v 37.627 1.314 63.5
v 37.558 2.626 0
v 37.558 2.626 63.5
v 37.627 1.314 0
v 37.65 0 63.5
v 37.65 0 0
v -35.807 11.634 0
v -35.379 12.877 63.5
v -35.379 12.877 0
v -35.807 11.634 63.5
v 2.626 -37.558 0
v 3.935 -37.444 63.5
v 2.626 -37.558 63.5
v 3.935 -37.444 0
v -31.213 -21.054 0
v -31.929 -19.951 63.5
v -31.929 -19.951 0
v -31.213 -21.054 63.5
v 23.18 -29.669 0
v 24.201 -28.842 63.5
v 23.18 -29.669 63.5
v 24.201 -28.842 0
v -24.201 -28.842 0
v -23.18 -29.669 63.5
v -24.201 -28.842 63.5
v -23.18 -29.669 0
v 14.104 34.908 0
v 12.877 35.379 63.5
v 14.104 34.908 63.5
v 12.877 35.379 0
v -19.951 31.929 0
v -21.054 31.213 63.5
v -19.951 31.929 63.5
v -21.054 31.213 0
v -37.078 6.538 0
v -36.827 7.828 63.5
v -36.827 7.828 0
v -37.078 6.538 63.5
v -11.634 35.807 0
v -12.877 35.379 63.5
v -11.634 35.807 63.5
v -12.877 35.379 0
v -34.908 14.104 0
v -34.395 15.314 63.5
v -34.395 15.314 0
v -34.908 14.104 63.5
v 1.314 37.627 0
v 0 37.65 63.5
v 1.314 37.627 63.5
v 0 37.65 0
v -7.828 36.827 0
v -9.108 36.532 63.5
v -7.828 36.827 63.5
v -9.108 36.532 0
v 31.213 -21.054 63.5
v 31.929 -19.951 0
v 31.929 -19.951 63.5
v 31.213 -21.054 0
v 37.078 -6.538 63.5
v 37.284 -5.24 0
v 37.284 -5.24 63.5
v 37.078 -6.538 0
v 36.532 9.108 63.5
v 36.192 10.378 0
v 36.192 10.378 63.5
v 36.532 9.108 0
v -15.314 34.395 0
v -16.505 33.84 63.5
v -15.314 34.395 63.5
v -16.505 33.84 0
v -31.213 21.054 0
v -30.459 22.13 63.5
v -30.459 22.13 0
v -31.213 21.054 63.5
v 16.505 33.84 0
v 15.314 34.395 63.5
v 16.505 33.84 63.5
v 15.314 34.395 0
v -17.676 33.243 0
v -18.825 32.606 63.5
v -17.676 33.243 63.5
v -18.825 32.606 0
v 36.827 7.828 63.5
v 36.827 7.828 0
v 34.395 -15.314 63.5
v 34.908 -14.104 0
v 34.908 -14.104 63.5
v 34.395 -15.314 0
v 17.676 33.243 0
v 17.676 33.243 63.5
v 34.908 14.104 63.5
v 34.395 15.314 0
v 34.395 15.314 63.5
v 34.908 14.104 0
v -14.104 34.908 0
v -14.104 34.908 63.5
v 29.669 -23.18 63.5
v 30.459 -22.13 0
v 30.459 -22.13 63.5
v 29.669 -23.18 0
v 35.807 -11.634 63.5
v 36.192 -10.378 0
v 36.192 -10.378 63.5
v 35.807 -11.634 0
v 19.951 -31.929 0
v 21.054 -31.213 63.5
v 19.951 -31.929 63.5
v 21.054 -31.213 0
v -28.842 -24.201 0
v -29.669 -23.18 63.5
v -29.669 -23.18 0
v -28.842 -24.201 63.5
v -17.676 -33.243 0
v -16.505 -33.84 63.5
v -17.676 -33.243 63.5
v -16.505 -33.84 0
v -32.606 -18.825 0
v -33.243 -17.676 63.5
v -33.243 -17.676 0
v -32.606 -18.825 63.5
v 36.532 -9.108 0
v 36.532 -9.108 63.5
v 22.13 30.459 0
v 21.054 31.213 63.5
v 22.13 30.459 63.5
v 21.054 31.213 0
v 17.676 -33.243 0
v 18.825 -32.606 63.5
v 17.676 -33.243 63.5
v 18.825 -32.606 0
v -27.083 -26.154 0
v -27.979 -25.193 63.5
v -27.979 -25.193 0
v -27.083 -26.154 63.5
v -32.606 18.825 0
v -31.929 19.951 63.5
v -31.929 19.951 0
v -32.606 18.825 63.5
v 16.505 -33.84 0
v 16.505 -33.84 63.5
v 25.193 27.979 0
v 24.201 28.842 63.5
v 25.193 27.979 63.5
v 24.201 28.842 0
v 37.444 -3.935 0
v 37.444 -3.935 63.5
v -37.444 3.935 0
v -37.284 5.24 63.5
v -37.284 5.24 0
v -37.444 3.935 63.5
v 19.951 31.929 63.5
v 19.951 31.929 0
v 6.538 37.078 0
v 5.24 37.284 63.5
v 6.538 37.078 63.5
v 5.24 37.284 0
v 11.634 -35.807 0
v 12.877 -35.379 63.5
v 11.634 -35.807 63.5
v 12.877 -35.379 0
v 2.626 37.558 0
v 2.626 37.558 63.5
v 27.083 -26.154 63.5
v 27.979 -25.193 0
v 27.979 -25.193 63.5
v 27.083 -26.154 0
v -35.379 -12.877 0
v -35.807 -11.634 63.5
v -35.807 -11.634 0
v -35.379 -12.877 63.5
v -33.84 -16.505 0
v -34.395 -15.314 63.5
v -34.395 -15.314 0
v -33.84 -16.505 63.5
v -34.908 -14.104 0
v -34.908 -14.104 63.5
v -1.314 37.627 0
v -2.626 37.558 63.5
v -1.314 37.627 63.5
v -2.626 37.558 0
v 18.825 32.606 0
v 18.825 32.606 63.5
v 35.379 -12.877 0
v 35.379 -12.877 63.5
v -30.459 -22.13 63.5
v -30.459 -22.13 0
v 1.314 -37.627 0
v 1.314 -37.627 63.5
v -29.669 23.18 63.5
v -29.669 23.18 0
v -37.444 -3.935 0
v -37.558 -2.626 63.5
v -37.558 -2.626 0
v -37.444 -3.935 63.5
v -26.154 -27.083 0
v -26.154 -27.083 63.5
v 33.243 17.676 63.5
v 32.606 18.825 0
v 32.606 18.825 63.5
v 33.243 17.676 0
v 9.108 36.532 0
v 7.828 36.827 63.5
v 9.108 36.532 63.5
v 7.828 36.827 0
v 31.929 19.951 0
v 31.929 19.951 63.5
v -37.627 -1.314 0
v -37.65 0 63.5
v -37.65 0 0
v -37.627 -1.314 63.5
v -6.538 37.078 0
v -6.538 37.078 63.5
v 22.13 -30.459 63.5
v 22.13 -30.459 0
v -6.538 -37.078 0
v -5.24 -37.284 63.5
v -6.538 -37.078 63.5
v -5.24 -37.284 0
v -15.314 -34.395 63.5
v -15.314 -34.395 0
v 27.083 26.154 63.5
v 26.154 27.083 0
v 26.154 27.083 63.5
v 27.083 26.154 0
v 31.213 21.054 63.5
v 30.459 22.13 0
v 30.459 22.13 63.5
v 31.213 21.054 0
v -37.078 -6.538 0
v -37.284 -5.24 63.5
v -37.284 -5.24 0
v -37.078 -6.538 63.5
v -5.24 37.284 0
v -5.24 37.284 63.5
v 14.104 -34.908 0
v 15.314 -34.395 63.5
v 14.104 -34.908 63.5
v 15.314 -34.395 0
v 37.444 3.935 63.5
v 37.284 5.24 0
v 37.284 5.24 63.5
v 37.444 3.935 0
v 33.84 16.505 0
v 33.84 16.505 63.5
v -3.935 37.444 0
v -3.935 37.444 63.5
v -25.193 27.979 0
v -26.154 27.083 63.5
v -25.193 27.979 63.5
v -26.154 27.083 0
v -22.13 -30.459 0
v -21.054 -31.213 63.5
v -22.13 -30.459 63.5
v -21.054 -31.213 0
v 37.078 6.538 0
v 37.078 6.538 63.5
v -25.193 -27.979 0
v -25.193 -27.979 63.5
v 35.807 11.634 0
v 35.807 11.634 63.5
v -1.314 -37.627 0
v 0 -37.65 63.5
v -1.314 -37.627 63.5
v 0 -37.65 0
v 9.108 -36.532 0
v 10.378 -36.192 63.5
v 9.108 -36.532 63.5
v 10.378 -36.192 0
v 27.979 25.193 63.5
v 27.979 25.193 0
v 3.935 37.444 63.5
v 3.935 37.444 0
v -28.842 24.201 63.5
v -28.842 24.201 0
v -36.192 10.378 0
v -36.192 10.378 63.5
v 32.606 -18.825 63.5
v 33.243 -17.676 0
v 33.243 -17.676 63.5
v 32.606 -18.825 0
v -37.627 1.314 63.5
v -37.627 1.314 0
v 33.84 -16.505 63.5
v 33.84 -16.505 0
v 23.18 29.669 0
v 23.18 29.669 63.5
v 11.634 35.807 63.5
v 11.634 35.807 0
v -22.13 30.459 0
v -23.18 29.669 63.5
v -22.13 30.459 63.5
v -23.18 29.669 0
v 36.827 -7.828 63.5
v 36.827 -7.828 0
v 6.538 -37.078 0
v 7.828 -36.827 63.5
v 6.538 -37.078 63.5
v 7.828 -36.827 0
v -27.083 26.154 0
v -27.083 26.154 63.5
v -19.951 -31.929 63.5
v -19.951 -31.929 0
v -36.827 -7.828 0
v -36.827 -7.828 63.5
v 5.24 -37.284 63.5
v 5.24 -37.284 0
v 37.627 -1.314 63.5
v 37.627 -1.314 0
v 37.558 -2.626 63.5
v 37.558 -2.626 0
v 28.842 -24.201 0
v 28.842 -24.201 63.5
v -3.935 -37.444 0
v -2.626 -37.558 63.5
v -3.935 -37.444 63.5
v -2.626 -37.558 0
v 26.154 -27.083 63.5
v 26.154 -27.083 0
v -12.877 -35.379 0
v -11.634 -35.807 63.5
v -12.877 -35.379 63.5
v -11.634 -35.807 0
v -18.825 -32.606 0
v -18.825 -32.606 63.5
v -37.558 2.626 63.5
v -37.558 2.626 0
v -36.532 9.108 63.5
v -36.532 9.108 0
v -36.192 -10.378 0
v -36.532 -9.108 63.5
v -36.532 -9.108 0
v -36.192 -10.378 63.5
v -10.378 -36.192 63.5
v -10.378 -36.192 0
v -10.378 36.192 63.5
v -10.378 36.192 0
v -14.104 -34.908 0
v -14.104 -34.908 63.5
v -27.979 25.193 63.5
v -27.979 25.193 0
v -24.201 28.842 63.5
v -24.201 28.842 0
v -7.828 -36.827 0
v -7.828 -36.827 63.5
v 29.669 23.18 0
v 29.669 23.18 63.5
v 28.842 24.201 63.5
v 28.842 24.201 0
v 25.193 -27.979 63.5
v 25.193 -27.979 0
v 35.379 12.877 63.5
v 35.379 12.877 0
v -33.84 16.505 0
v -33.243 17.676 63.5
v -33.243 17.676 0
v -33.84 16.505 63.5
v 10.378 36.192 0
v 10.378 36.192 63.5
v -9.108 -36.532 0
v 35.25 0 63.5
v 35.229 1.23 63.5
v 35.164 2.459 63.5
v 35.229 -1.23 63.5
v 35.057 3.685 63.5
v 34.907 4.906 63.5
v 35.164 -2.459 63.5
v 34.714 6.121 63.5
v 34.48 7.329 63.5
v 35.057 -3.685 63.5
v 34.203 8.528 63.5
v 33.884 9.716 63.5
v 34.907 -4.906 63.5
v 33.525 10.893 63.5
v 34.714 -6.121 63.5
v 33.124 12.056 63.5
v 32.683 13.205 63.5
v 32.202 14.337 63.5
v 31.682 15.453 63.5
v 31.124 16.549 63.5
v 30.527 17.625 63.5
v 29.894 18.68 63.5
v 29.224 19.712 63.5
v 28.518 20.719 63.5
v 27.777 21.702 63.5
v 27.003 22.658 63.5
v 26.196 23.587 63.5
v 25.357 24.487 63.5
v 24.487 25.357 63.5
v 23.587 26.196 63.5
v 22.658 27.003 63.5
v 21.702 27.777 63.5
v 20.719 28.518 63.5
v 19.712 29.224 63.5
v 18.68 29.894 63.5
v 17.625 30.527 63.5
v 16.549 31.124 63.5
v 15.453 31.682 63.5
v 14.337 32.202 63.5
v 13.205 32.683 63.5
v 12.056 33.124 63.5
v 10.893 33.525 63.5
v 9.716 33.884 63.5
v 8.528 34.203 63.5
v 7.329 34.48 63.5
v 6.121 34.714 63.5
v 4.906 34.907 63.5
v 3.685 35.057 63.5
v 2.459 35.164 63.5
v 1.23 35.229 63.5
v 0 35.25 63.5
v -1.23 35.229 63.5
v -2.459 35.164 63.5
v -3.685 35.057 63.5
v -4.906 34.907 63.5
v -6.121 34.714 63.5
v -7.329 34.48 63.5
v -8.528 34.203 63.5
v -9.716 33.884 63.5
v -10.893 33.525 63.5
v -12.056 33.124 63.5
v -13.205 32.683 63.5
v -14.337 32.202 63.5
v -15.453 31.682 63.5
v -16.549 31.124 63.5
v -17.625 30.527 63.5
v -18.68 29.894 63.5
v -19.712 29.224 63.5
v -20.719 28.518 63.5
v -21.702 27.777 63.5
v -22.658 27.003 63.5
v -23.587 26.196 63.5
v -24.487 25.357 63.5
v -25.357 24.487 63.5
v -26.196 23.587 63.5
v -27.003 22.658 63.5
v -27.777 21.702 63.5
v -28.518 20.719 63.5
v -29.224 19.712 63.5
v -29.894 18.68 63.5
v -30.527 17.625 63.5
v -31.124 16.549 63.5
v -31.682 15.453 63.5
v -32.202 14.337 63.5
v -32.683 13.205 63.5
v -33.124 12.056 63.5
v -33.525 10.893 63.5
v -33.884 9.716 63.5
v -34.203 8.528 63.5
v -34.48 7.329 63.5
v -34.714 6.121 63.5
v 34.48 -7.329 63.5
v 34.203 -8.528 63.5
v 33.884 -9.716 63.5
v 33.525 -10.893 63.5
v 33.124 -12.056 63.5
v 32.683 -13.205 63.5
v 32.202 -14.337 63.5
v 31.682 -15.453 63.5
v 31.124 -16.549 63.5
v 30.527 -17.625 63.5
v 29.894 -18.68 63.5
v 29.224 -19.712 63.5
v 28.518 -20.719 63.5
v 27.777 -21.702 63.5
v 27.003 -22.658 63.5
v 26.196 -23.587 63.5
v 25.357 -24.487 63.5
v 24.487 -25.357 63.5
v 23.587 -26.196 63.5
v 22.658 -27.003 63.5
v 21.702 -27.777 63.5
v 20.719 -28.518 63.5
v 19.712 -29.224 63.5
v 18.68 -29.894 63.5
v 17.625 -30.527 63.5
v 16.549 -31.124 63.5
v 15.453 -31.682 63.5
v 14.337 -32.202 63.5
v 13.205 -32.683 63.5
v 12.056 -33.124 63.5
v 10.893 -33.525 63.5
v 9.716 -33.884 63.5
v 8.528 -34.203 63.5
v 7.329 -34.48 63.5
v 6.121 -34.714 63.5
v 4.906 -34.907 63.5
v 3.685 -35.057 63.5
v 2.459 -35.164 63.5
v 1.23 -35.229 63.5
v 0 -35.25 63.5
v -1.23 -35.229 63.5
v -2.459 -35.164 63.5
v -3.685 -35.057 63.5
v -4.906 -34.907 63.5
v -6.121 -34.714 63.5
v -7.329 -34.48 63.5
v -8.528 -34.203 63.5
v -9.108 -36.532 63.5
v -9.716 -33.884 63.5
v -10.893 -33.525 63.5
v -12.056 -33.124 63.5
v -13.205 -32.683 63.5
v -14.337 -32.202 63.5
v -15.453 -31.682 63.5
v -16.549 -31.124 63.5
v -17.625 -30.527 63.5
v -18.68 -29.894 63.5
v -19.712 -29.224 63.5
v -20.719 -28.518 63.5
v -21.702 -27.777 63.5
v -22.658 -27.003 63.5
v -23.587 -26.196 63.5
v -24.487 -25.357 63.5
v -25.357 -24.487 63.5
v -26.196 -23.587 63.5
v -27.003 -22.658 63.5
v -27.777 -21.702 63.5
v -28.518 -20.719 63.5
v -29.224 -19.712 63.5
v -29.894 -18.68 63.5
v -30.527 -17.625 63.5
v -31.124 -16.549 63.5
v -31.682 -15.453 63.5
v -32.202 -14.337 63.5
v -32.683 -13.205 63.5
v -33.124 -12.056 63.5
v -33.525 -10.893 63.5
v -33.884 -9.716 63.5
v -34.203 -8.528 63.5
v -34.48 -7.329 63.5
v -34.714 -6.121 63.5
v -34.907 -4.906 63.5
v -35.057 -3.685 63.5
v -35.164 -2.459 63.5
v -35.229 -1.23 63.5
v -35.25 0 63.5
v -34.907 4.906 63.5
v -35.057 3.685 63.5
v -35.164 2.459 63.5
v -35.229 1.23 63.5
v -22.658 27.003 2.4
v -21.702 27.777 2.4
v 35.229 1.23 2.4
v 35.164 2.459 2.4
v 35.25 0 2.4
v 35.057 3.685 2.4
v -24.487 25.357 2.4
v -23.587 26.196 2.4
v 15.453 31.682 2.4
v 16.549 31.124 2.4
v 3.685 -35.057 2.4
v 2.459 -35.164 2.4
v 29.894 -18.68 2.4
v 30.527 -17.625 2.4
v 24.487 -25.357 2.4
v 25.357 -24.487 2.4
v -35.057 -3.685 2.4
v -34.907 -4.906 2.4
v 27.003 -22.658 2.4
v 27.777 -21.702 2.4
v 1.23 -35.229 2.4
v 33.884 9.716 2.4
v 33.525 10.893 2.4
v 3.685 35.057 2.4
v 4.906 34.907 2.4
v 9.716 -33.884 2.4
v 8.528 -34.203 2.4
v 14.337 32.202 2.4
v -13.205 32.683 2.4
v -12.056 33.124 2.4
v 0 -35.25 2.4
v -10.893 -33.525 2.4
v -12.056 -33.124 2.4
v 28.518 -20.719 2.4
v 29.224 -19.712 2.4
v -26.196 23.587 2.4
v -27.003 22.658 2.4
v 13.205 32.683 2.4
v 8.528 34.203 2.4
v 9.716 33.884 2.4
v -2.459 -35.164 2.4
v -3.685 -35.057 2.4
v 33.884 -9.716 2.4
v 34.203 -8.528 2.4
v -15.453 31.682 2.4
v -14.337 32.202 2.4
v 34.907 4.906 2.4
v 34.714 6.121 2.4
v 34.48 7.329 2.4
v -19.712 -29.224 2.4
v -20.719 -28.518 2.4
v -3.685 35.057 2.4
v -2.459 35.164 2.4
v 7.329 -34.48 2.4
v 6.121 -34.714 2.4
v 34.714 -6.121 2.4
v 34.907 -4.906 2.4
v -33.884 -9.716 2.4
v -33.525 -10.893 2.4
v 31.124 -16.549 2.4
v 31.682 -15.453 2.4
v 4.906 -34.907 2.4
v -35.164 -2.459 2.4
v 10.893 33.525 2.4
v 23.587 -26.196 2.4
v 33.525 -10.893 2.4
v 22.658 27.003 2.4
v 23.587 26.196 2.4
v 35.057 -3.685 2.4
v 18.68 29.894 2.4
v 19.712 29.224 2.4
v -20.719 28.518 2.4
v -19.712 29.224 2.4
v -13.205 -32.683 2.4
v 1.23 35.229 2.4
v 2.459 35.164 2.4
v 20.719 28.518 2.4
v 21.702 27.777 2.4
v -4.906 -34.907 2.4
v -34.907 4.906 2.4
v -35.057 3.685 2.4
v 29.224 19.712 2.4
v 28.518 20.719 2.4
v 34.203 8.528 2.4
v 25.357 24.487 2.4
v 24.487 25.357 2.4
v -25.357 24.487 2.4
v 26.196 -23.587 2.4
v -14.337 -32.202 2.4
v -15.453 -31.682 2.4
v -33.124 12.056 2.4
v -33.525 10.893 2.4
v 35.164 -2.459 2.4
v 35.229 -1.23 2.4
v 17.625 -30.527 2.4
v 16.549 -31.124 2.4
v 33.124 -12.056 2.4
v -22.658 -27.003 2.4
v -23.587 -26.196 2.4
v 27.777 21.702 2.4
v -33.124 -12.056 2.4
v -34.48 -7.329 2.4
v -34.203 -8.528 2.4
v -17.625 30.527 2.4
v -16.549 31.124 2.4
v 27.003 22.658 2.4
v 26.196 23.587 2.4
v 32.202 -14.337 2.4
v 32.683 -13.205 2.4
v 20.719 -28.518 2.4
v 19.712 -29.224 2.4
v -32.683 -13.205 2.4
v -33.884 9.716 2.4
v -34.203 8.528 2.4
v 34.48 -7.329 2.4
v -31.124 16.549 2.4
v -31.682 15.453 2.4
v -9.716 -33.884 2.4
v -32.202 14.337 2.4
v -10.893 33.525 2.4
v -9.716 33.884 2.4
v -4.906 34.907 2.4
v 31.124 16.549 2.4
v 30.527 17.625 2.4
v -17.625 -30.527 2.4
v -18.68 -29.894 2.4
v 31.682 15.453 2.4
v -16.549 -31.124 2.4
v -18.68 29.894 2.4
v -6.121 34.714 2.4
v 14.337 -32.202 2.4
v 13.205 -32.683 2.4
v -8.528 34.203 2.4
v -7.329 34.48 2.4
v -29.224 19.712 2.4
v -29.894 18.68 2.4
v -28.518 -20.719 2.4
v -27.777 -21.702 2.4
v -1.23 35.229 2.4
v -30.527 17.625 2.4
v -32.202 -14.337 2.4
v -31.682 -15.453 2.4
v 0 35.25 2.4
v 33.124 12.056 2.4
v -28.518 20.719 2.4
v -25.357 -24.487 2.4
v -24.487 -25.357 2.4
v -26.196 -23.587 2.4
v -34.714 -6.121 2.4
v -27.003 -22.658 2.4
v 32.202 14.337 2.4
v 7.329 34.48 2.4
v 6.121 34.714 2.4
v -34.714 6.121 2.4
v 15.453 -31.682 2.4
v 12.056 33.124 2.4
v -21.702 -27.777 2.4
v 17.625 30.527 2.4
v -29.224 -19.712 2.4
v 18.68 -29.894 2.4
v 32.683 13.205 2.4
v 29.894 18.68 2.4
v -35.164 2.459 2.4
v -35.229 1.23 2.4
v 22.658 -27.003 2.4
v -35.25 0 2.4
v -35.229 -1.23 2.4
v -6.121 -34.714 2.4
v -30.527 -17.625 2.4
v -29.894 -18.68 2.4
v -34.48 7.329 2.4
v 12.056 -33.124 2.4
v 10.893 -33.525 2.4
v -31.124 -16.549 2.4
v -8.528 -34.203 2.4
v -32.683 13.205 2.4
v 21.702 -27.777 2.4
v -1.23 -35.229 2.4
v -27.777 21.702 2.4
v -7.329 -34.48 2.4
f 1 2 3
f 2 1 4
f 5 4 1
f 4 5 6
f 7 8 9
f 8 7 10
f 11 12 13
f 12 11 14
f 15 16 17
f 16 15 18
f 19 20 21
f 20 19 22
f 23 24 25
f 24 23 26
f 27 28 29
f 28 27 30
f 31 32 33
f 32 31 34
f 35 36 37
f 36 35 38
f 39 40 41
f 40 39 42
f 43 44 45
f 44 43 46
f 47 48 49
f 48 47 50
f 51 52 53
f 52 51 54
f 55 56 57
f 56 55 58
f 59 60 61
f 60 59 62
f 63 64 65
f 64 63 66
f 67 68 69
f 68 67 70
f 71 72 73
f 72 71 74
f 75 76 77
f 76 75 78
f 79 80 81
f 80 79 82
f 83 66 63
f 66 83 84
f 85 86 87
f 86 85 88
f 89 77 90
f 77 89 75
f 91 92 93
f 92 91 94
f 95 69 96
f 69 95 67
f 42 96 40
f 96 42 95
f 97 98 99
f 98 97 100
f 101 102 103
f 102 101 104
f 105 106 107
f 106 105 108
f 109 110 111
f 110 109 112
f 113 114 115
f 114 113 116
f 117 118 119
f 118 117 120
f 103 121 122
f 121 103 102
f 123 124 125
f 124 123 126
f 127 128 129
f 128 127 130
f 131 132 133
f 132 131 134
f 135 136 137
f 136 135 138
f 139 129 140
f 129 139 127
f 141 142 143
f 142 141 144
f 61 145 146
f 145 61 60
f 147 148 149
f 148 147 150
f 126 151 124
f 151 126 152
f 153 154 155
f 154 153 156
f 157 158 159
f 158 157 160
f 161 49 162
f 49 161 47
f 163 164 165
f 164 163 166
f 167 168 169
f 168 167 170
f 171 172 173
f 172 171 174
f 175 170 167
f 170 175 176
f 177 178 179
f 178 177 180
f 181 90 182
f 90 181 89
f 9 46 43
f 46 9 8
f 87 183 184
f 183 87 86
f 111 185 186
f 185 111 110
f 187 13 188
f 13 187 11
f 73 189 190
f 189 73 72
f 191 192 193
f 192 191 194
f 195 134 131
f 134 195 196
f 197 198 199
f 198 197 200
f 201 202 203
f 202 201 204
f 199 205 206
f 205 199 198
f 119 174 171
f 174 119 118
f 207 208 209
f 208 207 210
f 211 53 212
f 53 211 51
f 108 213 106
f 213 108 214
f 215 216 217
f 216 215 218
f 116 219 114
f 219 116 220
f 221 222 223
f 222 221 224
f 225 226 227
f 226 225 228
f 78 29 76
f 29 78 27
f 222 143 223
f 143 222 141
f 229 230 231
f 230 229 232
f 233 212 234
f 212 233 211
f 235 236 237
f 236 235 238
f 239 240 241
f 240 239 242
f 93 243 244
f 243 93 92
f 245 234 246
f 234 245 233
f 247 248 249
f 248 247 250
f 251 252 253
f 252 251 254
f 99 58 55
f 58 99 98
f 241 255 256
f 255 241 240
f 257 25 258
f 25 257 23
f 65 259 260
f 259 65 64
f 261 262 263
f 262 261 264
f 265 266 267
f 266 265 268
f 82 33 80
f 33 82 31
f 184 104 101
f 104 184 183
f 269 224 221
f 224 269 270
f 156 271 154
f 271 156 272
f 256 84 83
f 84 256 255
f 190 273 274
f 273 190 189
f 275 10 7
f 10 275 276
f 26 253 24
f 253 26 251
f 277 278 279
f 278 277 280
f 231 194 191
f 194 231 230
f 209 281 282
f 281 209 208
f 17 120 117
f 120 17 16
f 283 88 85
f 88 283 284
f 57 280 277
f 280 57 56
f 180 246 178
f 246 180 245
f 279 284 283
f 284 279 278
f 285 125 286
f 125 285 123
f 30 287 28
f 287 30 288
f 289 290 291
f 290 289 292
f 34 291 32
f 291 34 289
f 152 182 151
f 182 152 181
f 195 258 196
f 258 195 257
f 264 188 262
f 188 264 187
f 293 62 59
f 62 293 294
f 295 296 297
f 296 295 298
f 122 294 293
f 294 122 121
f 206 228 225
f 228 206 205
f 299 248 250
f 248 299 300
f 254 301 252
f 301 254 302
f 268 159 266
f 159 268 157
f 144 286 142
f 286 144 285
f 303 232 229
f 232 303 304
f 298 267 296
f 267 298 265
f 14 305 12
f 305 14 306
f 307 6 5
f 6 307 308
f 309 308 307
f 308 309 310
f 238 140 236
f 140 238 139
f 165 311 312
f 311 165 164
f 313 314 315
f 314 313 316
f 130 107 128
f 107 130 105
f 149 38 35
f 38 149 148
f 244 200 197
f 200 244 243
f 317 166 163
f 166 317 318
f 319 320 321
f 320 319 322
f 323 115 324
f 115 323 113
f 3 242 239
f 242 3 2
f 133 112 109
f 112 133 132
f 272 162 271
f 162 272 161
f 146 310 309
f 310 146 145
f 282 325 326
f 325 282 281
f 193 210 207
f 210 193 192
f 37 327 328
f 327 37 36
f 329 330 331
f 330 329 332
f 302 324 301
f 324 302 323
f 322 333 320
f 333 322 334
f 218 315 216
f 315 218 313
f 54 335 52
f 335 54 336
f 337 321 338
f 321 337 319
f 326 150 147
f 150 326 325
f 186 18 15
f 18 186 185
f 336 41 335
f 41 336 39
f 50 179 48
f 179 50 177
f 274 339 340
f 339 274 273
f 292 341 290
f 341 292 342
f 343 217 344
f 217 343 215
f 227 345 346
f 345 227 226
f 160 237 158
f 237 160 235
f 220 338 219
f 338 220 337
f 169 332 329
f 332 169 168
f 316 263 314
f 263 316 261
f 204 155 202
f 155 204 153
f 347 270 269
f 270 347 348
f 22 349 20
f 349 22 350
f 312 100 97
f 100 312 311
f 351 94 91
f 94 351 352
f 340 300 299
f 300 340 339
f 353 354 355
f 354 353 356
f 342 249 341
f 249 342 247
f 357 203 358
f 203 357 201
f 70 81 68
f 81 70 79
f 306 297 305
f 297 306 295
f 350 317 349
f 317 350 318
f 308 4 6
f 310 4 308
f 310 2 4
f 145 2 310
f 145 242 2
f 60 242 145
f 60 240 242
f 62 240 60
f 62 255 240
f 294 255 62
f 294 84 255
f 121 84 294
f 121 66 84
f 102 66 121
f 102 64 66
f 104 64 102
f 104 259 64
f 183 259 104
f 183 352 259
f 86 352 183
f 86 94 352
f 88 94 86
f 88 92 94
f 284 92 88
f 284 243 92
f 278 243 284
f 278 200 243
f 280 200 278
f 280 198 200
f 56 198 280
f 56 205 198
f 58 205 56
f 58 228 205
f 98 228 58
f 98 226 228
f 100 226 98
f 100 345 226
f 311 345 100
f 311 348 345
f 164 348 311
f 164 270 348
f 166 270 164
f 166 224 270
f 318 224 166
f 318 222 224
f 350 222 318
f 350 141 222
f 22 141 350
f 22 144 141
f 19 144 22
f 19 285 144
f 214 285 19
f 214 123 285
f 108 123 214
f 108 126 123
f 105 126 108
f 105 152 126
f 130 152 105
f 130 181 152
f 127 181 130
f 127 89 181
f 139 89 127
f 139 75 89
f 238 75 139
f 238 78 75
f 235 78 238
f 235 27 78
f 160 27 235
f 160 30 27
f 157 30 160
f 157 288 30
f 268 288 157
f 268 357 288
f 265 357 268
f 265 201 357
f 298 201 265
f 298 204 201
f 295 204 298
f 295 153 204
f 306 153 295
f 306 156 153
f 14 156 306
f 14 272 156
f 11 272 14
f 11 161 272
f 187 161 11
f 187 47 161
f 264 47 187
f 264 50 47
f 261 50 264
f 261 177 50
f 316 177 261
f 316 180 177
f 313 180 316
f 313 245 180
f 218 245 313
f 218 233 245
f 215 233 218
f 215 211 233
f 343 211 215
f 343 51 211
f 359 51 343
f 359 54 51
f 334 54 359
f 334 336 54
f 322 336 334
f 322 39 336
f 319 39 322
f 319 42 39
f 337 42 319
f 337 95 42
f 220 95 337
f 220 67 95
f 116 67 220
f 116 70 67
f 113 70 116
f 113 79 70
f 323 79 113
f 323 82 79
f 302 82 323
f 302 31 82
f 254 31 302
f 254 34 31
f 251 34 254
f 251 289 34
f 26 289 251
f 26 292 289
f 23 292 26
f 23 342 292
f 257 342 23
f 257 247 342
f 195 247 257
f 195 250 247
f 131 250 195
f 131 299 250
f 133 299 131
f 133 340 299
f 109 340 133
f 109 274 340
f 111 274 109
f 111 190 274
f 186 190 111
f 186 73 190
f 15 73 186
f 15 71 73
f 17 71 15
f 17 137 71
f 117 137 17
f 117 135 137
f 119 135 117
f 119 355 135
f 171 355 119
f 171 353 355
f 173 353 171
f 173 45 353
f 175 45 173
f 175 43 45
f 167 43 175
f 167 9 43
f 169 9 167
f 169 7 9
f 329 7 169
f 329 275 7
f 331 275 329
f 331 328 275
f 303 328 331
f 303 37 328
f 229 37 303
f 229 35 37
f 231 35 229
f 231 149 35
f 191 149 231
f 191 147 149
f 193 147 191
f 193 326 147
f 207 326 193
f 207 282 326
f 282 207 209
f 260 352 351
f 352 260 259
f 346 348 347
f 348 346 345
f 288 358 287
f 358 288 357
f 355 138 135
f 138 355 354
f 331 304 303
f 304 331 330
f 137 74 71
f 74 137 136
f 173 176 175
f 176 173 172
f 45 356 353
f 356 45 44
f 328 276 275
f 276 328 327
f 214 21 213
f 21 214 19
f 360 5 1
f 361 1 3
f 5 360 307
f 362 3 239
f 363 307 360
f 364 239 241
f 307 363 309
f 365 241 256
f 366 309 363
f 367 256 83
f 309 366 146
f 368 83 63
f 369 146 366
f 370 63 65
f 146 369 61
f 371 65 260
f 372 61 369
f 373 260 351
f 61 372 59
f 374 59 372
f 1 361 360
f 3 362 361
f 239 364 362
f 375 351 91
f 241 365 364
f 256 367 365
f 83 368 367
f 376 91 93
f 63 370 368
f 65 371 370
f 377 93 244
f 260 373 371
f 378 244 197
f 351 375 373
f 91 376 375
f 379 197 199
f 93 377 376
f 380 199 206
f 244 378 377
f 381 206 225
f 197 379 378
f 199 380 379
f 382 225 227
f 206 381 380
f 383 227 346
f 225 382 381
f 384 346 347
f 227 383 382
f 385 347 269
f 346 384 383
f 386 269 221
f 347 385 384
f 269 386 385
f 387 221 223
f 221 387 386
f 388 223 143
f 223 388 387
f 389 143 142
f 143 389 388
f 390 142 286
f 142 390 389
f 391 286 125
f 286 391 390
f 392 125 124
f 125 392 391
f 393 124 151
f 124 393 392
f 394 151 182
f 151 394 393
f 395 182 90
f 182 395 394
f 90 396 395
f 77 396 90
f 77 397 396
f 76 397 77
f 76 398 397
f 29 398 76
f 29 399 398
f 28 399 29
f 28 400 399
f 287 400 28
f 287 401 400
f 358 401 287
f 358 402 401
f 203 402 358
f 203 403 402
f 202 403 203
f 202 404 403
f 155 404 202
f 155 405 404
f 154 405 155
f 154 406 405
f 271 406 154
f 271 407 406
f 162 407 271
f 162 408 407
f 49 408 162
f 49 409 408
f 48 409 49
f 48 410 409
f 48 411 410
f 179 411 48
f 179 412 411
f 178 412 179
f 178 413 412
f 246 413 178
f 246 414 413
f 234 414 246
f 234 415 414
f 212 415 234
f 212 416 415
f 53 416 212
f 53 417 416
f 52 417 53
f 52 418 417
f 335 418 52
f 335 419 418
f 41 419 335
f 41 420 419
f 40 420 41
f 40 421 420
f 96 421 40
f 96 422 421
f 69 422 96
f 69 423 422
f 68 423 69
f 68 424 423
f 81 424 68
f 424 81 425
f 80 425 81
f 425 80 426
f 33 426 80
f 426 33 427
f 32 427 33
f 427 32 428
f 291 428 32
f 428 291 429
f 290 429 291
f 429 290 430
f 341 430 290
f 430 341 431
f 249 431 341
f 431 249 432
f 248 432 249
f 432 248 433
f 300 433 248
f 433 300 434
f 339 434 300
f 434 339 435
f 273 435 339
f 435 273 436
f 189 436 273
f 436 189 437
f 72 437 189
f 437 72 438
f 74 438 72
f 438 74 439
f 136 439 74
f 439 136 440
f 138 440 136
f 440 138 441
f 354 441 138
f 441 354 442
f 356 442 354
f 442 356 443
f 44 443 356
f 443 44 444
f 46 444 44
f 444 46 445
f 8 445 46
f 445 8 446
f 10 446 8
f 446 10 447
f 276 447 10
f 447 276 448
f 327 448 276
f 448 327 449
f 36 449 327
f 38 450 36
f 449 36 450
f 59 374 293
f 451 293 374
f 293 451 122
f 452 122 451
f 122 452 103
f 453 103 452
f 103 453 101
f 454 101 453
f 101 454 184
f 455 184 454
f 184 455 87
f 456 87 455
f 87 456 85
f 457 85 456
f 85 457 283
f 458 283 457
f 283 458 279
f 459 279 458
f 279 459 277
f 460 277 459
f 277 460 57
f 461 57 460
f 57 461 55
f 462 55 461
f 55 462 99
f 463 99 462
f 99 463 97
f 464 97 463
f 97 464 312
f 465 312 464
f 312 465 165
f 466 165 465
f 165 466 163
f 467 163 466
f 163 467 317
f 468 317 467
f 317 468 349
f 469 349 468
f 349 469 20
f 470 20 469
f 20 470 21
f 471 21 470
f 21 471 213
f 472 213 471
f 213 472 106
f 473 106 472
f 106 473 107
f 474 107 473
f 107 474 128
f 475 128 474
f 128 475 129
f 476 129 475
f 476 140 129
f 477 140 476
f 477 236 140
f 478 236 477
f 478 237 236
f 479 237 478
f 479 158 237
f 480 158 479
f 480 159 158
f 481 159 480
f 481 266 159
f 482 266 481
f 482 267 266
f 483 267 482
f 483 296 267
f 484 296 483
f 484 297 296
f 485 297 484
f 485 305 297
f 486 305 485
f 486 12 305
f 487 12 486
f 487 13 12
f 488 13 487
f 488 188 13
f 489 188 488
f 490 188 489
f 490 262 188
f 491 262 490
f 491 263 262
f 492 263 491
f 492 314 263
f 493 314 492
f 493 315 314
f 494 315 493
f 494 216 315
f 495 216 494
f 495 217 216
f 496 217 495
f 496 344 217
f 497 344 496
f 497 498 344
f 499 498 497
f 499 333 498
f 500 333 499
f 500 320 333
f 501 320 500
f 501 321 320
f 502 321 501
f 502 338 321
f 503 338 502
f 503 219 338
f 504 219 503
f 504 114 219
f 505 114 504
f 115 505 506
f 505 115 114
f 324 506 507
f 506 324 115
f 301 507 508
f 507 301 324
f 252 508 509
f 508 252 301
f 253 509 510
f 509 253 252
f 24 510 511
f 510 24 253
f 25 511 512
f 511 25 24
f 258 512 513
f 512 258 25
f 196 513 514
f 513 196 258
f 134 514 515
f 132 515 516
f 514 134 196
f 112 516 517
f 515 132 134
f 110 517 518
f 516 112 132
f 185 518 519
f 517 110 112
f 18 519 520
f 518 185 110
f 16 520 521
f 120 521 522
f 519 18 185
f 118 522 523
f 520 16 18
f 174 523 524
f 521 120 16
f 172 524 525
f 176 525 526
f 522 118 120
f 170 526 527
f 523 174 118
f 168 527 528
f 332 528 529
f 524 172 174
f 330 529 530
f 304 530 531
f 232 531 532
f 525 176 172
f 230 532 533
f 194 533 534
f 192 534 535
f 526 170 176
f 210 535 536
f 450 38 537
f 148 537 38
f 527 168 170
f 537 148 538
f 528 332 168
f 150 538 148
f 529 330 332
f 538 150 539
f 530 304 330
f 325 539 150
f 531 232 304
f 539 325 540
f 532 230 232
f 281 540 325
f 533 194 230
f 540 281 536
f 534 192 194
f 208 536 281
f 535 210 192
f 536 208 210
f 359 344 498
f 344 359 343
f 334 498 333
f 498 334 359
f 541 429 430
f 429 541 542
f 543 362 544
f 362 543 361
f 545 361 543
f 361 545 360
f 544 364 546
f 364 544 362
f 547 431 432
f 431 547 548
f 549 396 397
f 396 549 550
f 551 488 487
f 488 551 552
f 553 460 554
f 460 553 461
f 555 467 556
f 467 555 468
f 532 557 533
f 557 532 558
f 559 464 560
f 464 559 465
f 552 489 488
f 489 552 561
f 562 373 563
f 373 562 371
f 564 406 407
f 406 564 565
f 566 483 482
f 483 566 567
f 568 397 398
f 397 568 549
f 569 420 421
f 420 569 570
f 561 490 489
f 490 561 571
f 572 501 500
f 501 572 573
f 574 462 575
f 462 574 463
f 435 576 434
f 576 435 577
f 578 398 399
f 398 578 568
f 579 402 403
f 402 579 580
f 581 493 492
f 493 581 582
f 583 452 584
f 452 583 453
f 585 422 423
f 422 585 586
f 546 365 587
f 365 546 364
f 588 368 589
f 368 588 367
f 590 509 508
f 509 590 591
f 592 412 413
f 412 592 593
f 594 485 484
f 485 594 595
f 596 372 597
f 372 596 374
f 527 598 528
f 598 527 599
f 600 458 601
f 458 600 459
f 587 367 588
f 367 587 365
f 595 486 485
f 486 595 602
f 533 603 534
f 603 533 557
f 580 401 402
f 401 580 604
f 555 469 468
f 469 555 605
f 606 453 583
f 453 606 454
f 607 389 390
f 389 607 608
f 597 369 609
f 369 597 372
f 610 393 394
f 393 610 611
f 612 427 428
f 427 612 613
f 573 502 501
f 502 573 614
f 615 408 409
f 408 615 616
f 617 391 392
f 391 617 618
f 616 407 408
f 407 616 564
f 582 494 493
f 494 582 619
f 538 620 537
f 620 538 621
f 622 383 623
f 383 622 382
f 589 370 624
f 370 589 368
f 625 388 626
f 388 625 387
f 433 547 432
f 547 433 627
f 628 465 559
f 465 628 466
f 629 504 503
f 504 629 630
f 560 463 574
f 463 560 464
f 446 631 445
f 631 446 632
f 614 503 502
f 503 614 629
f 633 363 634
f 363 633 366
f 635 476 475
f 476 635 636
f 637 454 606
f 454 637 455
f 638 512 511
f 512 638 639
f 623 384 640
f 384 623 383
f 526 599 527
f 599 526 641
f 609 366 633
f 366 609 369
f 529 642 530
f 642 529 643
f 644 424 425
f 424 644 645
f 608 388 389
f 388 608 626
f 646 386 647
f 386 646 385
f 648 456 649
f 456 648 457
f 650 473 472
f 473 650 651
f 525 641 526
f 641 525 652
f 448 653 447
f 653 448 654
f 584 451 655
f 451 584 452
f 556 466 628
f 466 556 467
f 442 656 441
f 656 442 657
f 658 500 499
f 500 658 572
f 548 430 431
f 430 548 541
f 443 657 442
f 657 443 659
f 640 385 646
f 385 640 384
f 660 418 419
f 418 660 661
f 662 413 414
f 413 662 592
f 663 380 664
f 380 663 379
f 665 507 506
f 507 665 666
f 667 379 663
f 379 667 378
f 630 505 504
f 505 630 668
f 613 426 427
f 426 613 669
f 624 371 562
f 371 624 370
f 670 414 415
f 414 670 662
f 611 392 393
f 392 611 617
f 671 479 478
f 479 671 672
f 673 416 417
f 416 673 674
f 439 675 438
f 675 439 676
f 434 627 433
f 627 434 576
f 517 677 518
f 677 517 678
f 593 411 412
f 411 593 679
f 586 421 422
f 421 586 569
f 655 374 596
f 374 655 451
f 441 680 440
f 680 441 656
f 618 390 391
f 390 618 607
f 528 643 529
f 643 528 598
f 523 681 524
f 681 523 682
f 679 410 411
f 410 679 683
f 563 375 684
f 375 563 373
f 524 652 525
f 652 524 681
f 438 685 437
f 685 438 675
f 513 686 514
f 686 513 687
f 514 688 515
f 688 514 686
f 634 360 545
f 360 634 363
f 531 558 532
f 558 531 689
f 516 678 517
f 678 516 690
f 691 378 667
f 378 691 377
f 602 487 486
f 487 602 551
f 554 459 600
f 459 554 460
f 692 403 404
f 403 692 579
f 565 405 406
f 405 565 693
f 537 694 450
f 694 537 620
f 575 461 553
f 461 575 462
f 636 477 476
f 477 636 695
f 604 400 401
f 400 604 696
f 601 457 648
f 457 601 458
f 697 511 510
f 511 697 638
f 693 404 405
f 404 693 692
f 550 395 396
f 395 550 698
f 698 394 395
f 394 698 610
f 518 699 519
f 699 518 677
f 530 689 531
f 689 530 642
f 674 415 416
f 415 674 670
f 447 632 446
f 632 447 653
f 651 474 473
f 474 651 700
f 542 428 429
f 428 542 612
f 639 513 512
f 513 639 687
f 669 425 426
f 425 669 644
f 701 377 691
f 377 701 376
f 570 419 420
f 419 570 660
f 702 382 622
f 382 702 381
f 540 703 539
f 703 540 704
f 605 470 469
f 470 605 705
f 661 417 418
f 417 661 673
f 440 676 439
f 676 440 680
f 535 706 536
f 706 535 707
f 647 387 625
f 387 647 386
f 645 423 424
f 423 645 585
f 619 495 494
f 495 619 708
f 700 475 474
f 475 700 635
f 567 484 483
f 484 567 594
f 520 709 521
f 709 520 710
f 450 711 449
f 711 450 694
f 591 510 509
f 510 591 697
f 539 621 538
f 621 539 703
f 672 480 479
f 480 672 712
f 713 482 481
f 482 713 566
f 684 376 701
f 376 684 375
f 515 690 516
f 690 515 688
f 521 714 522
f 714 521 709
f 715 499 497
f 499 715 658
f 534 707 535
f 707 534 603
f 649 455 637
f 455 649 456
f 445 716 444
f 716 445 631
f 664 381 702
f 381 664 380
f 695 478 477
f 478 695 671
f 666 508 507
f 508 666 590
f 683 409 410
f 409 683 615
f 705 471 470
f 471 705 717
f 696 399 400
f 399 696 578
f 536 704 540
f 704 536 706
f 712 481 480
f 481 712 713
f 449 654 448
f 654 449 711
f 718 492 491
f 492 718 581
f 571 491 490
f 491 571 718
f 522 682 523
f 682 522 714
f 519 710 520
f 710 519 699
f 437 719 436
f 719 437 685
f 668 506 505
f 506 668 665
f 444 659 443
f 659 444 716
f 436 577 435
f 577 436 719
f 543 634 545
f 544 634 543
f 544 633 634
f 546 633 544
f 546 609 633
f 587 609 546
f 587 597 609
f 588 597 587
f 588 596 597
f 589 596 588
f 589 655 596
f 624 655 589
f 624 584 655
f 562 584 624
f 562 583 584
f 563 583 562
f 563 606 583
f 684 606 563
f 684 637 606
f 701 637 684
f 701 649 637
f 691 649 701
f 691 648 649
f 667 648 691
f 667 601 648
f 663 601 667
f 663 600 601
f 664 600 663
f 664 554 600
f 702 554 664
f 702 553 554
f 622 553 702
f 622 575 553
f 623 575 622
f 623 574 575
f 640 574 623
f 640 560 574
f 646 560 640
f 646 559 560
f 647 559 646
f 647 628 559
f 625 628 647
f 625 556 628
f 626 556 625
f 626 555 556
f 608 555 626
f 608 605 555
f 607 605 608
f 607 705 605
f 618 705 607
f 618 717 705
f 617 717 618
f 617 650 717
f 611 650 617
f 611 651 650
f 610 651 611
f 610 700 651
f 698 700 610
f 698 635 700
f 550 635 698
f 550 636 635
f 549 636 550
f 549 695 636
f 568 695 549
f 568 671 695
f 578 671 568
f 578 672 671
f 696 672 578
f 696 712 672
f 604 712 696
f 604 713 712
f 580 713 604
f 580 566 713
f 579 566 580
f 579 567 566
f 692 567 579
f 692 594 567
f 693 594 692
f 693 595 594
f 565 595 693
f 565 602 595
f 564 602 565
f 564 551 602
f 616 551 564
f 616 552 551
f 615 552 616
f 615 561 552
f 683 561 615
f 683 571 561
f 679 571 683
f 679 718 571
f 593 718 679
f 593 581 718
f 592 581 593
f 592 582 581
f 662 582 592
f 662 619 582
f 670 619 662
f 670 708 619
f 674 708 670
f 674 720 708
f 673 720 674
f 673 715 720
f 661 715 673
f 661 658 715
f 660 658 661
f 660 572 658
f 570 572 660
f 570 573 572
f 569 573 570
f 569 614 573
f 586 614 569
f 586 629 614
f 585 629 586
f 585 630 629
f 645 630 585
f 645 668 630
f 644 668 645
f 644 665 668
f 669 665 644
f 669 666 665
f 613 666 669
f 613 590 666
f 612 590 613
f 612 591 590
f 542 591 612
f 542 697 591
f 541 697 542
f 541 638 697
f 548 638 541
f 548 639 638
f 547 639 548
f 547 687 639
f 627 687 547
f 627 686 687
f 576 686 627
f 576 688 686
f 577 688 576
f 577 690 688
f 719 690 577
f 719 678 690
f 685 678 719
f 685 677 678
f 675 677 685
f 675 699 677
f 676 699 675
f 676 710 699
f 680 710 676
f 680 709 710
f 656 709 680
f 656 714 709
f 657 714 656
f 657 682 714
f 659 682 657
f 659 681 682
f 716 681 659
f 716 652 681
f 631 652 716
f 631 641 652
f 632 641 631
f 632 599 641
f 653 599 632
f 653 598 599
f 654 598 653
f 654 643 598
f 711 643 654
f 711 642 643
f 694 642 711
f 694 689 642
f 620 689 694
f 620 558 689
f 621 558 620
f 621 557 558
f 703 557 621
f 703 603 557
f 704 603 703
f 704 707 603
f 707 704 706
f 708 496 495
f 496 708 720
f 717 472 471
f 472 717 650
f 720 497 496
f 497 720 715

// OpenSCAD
$fa = 2;    // minimum angle (fine resolution)
$fs = 0.4;  // minimum size (fine resolution)

inch = 25.4 ;

internal_diameter = 2.5 * inch + 2 + 5; // needed extra 1/8th inch plus 2 more mm
height = 2.5 * inch;

thickness = 0.6 * 4; // good for 0.6mm nozzle

epsilon = 0.01;   // help avoid issues with floating-point rounding error
eps_vector = [epsilon, epsilon, epsilon];

difference () {
  cylinder(h = height, d = internal_diameter + 2 * thickness);
  translate([0, 0, thickness])
    cylinder(h = height, d = internal_diameter);
}
